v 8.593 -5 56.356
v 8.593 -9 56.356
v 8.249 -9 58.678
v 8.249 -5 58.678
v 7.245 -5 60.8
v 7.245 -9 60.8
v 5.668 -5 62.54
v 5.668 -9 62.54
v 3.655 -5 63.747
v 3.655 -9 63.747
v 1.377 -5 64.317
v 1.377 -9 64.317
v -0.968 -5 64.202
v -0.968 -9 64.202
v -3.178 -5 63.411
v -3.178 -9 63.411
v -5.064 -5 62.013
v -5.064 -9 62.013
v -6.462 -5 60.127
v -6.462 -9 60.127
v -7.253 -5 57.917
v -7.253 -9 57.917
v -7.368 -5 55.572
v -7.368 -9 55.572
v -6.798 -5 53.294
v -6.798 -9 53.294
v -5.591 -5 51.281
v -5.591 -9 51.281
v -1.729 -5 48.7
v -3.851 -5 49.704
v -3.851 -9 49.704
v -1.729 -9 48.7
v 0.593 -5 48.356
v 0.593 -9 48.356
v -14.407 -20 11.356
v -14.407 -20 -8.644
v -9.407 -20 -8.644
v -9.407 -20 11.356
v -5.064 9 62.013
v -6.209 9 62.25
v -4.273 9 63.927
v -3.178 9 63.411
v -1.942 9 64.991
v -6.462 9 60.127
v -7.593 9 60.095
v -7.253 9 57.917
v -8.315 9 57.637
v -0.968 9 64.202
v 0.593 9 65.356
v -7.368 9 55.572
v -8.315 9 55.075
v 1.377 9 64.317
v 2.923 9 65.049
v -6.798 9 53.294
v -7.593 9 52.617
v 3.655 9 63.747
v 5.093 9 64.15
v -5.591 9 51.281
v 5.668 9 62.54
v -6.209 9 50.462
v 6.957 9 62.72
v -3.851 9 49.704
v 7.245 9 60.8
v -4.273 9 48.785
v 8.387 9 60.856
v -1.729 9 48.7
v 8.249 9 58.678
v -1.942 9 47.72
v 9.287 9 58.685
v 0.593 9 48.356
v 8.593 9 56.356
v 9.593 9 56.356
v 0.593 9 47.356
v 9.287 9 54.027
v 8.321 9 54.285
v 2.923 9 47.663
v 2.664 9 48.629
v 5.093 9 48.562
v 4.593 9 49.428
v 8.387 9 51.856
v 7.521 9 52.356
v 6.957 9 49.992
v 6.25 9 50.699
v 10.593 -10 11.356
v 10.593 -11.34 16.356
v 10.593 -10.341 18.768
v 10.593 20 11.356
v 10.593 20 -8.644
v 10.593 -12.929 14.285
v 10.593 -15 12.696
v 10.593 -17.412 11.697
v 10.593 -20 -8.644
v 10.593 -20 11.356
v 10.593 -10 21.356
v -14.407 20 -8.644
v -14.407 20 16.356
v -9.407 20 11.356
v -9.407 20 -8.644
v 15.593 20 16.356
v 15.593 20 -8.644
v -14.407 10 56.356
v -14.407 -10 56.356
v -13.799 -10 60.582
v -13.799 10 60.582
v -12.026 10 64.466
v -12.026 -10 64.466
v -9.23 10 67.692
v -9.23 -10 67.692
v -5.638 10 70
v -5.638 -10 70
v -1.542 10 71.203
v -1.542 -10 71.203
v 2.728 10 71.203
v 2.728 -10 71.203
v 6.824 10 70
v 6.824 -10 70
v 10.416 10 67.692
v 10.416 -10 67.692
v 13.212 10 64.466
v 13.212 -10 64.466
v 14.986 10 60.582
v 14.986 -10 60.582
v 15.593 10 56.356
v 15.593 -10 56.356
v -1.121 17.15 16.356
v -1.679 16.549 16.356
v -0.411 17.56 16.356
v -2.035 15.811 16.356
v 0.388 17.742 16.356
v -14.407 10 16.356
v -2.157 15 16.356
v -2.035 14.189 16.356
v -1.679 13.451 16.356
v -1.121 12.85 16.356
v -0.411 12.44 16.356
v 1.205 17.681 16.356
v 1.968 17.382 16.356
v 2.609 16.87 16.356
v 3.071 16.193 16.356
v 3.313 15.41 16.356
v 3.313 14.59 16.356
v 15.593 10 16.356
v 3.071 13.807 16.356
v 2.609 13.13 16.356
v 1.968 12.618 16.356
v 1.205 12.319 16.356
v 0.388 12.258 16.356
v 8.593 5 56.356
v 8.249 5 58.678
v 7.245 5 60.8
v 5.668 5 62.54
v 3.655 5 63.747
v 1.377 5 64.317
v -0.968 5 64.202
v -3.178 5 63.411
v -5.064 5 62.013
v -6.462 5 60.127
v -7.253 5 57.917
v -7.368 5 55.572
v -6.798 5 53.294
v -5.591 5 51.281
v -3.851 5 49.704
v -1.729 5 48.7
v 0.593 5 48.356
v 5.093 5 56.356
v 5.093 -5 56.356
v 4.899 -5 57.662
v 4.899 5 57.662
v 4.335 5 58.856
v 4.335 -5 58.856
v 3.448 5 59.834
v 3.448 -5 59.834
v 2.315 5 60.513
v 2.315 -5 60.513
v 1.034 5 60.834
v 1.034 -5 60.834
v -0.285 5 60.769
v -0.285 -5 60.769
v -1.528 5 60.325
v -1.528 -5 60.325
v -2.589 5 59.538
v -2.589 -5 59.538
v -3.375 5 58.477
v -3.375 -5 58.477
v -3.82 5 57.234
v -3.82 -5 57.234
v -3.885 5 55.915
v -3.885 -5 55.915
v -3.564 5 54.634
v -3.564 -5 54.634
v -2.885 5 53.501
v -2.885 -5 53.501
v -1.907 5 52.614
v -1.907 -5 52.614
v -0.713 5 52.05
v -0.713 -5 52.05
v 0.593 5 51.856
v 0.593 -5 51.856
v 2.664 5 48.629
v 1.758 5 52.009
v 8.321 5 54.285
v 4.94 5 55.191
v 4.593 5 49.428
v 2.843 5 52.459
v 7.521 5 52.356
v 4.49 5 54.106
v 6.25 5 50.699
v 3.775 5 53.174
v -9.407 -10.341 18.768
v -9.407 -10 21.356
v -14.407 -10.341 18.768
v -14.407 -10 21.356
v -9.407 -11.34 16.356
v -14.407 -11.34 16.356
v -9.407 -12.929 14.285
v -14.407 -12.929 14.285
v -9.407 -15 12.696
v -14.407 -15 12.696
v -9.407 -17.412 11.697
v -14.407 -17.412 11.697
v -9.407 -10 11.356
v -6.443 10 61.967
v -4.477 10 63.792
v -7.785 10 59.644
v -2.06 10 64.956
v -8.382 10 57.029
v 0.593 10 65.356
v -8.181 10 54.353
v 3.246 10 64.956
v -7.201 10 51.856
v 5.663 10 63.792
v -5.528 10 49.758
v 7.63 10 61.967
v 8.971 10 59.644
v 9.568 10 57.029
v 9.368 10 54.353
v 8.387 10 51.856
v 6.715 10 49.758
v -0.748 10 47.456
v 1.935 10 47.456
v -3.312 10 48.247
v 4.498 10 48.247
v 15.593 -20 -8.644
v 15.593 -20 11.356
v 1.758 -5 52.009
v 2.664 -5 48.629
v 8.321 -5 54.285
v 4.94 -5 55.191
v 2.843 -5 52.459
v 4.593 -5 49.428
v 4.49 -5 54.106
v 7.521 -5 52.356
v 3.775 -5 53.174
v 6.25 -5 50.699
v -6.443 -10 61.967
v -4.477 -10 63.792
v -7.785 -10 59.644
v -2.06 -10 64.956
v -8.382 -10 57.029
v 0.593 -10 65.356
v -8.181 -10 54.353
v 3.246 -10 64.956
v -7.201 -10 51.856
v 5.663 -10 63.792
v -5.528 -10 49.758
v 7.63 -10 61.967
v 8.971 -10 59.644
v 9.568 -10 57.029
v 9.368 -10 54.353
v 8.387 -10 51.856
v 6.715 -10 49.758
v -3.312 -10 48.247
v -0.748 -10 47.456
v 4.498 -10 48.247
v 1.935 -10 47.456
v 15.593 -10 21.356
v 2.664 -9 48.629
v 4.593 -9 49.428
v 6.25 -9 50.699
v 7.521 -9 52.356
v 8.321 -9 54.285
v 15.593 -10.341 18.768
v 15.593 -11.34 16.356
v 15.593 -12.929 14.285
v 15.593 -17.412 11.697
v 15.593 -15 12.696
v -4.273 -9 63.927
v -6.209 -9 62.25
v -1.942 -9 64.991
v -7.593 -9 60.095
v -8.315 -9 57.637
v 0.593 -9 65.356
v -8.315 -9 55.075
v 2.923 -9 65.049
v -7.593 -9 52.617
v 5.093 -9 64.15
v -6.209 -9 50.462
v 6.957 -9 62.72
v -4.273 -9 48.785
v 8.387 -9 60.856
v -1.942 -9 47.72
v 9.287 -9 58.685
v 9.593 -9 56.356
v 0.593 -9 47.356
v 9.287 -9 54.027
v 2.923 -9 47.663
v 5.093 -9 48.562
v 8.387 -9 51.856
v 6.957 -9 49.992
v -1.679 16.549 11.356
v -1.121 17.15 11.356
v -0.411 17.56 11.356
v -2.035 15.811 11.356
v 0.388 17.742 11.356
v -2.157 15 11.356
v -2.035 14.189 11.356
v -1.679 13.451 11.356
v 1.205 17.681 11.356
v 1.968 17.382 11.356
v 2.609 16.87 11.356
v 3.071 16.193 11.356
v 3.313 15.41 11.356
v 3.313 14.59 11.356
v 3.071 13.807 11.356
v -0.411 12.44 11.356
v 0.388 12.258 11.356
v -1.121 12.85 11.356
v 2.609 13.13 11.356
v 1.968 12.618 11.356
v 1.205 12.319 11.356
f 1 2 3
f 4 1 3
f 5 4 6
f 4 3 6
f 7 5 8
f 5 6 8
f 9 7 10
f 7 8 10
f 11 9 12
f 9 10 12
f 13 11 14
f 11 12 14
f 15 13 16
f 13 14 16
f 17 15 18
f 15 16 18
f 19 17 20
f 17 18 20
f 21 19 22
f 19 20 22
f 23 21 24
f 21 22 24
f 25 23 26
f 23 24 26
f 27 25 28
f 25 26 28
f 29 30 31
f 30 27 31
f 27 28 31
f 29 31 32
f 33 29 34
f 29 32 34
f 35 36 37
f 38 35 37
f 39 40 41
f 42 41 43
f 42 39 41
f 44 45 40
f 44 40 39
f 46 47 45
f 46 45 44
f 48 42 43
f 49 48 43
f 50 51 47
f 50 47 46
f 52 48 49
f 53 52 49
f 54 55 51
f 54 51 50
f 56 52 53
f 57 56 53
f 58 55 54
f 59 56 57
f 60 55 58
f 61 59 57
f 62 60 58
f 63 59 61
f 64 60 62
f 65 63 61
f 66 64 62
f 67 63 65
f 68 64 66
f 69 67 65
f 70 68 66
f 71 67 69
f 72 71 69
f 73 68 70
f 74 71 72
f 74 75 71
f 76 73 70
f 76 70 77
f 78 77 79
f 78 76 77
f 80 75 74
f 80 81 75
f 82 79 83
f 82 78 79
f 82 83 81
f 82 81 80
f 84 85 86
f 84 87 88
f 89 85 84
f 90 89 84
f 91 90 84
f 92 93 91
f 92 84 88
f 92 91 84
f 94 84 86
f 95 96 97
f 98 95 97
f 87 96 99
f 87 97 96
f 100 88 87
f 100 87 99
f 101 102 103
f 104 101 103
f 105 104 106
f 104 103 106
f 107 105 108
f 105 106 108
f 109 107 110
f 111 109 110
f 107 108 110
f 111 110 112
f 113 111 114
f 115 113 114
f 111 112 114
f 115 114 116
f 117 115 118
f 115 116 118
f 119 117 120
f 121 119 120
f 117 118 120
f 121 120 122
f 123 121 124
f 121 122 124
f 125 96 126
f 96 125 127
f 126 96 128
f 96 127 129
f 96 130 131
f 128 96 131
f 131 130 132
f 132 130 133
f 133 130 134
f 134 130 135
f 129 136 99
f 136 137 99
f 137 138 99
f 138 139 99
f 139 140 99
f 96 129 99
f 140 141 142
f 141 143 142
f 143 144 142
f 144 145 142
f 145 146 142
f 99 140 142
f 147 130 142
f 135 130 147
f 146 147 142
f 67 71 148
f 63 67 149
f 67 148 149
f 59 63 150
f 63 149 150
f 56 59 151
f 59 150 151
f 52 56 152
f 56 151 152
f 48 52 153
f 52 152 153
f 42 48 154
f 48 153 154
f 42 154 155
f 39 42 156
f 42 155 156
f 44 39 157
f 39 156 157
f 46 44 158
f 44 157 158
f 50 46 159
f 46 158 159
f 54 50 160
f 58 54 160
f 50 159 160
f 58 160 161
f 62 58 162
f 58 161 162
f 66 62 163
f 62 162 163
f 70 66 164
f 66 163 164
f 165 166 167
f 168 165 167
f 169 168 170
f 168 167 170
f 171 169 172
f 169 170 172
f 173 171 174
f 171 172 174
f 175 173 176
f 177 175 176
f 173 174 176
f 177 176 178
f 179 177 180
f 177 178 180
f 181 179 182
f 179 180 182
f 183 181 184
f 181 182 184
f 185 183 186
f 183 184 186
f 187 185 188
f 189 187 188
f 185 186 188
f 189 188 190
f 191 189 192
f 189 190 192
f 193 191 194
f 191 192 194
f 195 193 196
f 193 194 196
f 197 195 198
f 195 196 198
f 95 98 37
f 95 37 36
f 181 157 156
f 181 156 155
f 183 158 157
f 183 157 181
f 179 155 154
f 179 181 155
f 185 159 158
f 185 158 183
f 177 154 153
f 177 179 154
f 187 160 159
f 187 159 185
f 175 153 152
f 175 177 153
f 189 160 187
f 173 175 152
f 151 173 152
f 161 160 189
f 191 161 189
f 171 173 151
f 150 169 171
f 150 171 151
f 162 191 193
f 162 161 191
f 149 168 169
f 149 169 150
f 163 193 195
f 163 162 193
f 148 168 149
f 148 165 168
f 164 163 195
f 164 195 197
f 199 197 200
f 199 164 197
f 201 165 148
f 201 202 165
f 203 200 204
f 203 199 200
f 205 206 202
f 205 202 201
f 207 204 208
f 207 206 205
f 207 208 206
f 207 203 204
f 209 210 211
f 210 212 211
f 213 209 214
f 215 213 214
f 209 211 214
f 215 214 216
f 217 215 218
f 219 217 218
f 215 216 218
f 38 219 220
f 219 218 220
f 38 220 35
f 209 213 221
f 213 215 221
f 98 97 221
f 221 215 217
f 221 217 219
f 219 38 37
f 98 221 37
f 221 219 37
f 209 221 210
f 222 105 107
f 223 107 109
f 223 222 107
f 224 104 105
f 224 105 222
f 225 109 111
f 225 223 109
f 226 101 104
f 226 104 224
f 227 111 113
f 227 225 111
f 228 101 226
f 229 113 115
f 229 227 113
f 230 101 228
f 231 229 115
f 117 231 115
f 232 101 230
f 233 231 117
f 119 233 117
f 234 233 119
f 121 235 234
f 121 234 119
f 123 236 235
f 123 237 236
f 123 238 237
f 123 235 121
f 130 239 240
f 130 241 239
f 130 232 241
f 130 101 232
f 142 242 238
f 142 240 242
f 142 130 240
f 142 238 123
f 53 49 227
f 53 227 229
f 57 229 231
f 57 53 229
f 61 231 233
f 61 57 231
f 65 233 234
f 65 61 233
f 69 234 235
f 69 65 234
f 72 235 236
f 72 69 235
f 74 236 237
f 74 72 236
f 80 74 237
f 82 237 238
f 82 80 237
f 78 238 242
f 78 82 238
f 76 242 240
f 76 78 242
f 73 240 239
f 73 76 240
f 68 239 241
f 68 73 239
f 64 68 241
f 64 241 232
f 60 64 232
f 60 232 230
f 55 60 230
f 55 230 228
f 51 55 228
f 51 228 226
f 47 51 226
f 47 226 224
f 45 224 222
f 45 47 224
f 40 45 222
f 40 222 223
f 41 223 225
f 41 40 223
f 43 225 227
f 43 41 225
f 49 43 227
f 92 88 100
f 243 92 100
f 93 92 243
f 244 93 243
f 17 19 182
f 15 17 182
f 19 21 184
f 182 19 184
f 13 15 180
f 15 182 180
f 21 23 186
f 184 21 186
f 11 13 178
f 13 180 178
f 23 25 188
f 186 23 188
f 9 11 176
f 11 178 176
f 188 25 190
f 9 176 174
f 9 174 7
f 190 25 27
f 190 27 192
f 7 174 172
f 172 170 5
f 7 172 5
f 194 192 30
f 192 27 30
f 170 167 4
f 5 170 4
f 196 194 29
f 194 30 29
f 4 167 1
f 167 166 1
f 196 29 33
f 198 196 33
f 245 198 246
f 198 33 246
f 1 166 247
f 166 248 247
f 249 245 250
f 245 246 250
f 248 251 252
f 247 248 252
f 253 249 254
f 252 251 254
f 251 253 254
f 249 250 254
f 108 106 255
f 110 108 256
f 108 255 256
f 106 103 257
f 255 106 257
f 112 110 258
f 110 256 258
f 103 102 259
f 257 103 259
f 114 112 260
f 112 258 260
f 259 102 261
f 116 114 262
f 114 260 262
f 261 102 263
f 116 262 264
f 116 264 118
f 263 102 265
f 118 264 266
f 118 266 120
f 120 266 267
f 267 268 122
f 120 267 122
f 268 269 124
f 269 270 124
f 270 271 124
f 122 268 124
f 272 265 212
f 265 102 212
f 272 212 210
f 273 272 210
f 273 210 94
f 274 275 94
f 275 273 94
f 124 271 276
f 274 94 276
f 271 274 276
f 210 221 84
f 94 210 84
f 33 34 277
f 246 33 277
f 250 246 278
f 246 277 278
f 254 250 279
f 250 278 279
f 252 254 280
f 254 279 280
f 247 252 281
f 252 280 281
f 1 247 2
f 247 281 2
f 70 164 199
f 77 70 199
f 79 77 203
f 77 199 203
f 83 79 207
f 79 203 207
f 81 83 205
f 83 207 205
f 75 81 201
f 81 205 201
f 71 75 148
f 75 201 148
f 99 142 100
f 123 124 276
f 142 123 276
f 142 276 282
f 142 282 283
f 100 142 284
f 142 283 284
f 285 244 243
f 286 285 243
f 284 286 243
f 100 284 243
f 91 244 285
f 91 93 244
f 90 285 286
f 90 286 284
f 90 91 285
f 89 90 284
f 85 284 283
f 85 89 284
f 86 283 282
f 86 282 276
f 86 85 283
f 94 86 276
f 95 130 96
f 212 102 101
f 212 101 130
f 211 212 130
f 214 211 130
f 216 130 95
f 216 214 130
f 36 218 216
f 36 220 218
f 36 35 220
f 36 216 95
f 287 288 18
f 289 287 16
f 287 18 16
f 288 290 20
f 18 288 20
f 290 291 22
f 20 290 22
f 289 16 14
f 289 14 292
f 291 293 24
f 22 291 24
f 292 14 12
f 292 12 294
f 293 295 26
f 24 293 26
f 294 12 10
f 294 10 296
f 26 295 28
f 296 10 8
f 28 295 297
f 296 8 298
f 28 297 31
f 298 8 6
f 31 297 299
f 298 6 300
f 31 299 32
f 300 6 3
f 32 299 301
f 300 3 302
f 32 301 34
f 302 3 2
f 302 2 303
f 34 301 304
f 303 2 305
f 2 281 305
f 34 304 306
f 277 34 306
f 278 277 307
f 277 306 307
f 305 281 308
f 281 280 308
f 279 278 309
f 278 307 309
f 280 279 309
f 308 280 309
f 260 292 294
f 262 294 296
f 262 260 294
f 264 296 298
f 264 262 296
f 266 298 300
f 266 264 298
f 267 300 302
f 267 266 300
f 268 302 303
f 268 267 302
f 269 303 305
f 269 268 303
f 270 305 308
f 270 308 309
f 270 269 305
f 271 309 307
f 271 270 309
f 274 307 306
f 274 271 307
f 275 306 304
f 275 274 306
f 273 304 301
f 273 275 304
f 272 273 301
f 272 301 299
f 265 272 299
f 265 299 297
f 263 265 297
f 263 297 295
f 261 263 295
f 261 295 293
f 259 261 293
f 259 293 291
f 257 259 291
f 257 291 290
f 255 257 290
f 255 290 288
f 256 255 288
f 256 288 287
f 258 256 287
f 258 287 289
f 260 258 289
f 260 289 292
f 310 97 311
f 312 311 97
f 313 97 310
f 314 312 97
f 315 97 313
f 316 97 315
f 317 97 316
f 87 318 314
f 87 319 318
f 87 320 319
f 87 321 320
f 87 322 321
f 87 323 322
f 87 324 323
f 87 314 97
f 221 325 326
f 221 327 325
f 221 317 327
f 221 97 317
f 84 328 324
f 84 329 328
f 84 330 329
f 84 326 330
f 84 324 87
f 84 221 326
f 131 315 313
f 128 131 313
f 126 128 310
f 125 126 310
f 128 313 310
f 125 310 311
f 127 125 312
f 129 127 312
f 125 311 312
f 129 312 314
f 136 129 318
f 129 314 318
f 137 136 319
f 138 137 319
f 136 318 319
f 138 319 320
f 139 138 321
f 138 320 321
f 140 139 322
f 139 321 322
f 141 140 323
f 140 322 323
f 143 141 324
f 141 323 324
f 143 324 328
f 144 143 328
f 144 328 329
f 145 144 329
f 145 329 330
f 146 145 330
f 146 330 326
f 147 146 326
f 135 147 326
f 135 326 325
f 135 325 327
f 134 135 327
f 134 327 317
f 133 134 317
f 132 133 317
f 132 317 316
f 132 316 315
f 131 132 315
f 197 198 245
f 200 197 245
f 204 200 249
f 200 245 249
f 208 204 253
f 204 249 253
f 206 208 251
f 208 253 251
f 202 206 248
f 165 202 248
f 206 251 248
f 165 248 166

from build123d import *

# Parameters (mm, degrees)
BOSS_EXTRUDE1_DEPTH      = 10
BOSS_EXTRUDE1_DEPTH_BACK = 10
SKETCH1_R                = 9
BOSS_EXTRUDE2_DEPTH      = 9
BOSS_EXTRUDE2_DEPTH_BACK = 9
BOSS_EXTRUDE4_DEPTH      = 5
BOSS_EXTRUDE4_DEPTH_BACK = 5
BOSS_EXTRUDE3_DEPTH      = 10
BOSS_EXTRUDE3_DEPTH_BACK = 30
SKETCH2_W                = 5
SKETCH2_H                = 20
SKETCH6_W                = 30
SKETCH6_H                = 5
BOSS_EXTRUDE6_DEPTH      = 10
FILLET1_R                = 10
M5_CLEARANCE_HOLE1_D     = 5.5


with BuildPart() as part:
    # Sketch1 → Boss-Extrude1 (new, two sides: drawn at the far end of the back side and taken through both)
    with BuildSketch(Plane(origin=(0, 0, 0), x_dir=(1, 0, 0), z_dir=(0, 1, 0)).offset(-BOSS_EXTRUDE1_DEPTH_BACK)):
        with BuildLine():
            Line((-9.406779661, -11.355932203), (-9.406779661, 8.644067797))
            Line((-9.406779661, 8.644067797), (-14.406779661, 8.644067797))
            Line((-14.406779661, 8.644067797), (-14.406779661, -56.355932203))
            ThreePointArc((-14.406779661, -56.355932203), (0.593220339, -71.355932203), (15.593220339, -56.355932203))
            Line((15.593220339, -56.355932203), (15.593220339, 8.644067797))
            Line((15.593220339, 8.644067797), (10.593220339, 8.644067797))
            Line((10.593220339, 8.644067797), (10.593220339, -11.355932203))
            Line((10.593220339, -11.355932203), (-9.406779661, -11.355932203))
        make_face()
        with Locations(Location((0.593220339, -56.355932203, 0), (0, 0, 270))):
            Circle(SKETCH1_R, mode=Mode.SUBTRACT)
    extrude(amount=BOSS_EXTRUDE1_DEPTH + BOSS_EXTRUDE1_DEPTH_BACK)

    # Sketch1<3> → Boss-Extrude2 (add, two sides: drawn at the far end of the back side and taken through both)
    # profile 1 of 2: a face of its own
    with BuildSketch(Plane(origin=(0, 0, 0), x_dir=(1, 0, 0), z_dir=(0, 1, 0)).offset(-BOSS_EXTRUDE2_DEPTH_BACK)):
        with BuildLine():
            ThreePointArc((9.593220339, -56.355932203), (6.95718137, -49.991971173), (0.593220339, -47.355932203))
            ThreePointArc((0.593220339, -47.355932203), (-5.770740692, -62.719893234), (9.593220339, -56.355932203))
        make_face()
        with BuildLine():
            ThreePointArc((8.593220339, -56.355932203), (-5.063633911, -62.012786453), (0.593220339, -48.355932203))
            ThreePointArc((0.593220339, -48.355932203), (6.250074588, -50.699077954), (8.593220339, -56.355932203))
        make_face(mode=Mode.SUBTRACT)
    # profile 2 of 2: a face of its own
    with BuildSketch(Plane(origin=(0, 0, 0), x_dir=(1, 0, 0), z_dir=(0, 1, 0)).offset(-BOSS_EXTRUDE2_DEPTH_BACK)):
        with BuildLine():
            ThreePointArc((9.593220339, -56.355932203), (6.95718137, -49.991971173), (0.593220339, -47.355932203))
            ThreePointArc((0.593220339, -47.355932203), (-5.770740692, -62.719893234), (9.593220339, -56.355932203))
        make_face()
        with BuildLine():
            ThreePointArc((8.593220339, -56.355932203), (-5.063633911, -62.012786453), (0.593220339, -48.355932203))
            ThreePointArc((0.593220339, -48.355932203), (6.250074588, -50.699077954), (8.593220339, -56.355932203))
        make_face(mode=Mode.SUBTRACT)
    extrude(amount=BOSS_EXTRUDE2_DEPTH + BOSS_EXTRUDE2_DEPTH_BACK)

    # Sketch1<4> → Boss-Extrude4 (add, two sides: drawn at the far end of the back side and taken through both)
    # profile 1 of 2: a face of its own
    with BuildSketch(Plane(origin=(0, 0, 0), x_dir=(1, 0, 0), z_dir=(0, 1, 0)).offset(-BOSS_EXTRUDE4_DEPTH_BACK)):
        with BuildLine():
            ThreePointArc((8.593220339, -56.355932203), (6.250074588, -50.699077954), (0.593220339, -48.355932203))
            ThreePointArc((0.593220339, -48.355932203), (-5.063633911, -62.012786453), (8.593220339, -56.355932203))
        make_face()
        with BuildLine():
            ThreePointArc((5.093220339, -56.355932203), (-2.588760176, -59.537912719), (0.593220339, -51.855932203))
            ThreePointArc((0.593220339, -51.855932203), (3.775200854, -53.173951688), (5.093220339, -56.355932203))
        make_face(mode=Mode.SUBTRACT)
    # profile 2 of 2: a face of its own
    with BuildSketch(Plane(origin=(0, 0, 0), x_dir=(1, 0, 0), z_dir=(0, 1, 0)).offset(-BOSS_EXTRUDE4_DEPTH_BACK)):
        with BuildLine():
            ThreePointArc((8.593220339, -56.355932203), (6.250074588, -50.699077954), (0.593220339, -48.355932203))
            ThreePointArc((0.593220339, -48.355932203), (-5.063633911, -62.012786453), (8.593220339, -56.355932203))
        make_face()
        with BuildLine():
            ThreePointArc((5.093220339, -56.355932203), (-2.588760176, -59.537912719), (0.593220339, -51.855932203))
            ThreePointArc((0.593220339, -51.855932203), (3.775200854, -53.173951688), (5.093220339, -56.355932203))
        make_face(mode=Mode.SUBTRACT)
    extrude(amount=BOSS_EXTRUDE4_DEPTH + BOSS_EXTRUDE4_DEPTH_BACK)

    # Sketch2 → Boss-Extrude3 (add, two sides: drawn at the far end of the back side and taken through both)
    with BuildSketch(Plane(origin=(0, 10, 0), x_dir=(1, 0, 0), z_dir=(0, 1, 0)).offset(-BOSS_EXTRUDE3_DEPTH_BACK)):
        with Locations((13.093220339, -1.355932203)):
            Rectangle(SKETCH2_W, SKETCH2_H)
        with Locations((-11.906779661, -1.355932203)):
            Rectangle(SKETCH2_W, SKETCH2_H)
    extrude(amount=BOSS_EXTRUDE3_DEPTH + BOSS_EXTRUDE3_DEPTH_BACK)

    # Sketch6 → Boss-Extrude6 (add)
    with BuildSketch(Plane(origin=(0, 10, 0), x_dir=(1, 0, 0), z_dir=(0, 1, 0))):
        with Locations((0.593220339, -13.855932203)):
            Rectangle(SKETCH6_W, SKETCH6_H)
    extrude(amount=BOSS_EXTRUDE6_DEPTH)

    # Fillet1
    fillet1_edges = [part.edges().sort_by_distance(p)[0] for p in [
        (-11.906779661, -10, 11.355932203),
        (13.093220339, -10, 11.355932203),
    ]]
    fillet(fillet1_edges, radius=FILLET1_R - 0.0001)  # a hair under: the kernel refuses the full size

    # M5 Clearance Hole1 (through all)
    with Locations(Plane.XY.offset(16.355932203)):
        with Locations((0.593220339, 15)):
            Hole(M5_CLEARANCE_HOLE1_D / 2)


solid = part.part
